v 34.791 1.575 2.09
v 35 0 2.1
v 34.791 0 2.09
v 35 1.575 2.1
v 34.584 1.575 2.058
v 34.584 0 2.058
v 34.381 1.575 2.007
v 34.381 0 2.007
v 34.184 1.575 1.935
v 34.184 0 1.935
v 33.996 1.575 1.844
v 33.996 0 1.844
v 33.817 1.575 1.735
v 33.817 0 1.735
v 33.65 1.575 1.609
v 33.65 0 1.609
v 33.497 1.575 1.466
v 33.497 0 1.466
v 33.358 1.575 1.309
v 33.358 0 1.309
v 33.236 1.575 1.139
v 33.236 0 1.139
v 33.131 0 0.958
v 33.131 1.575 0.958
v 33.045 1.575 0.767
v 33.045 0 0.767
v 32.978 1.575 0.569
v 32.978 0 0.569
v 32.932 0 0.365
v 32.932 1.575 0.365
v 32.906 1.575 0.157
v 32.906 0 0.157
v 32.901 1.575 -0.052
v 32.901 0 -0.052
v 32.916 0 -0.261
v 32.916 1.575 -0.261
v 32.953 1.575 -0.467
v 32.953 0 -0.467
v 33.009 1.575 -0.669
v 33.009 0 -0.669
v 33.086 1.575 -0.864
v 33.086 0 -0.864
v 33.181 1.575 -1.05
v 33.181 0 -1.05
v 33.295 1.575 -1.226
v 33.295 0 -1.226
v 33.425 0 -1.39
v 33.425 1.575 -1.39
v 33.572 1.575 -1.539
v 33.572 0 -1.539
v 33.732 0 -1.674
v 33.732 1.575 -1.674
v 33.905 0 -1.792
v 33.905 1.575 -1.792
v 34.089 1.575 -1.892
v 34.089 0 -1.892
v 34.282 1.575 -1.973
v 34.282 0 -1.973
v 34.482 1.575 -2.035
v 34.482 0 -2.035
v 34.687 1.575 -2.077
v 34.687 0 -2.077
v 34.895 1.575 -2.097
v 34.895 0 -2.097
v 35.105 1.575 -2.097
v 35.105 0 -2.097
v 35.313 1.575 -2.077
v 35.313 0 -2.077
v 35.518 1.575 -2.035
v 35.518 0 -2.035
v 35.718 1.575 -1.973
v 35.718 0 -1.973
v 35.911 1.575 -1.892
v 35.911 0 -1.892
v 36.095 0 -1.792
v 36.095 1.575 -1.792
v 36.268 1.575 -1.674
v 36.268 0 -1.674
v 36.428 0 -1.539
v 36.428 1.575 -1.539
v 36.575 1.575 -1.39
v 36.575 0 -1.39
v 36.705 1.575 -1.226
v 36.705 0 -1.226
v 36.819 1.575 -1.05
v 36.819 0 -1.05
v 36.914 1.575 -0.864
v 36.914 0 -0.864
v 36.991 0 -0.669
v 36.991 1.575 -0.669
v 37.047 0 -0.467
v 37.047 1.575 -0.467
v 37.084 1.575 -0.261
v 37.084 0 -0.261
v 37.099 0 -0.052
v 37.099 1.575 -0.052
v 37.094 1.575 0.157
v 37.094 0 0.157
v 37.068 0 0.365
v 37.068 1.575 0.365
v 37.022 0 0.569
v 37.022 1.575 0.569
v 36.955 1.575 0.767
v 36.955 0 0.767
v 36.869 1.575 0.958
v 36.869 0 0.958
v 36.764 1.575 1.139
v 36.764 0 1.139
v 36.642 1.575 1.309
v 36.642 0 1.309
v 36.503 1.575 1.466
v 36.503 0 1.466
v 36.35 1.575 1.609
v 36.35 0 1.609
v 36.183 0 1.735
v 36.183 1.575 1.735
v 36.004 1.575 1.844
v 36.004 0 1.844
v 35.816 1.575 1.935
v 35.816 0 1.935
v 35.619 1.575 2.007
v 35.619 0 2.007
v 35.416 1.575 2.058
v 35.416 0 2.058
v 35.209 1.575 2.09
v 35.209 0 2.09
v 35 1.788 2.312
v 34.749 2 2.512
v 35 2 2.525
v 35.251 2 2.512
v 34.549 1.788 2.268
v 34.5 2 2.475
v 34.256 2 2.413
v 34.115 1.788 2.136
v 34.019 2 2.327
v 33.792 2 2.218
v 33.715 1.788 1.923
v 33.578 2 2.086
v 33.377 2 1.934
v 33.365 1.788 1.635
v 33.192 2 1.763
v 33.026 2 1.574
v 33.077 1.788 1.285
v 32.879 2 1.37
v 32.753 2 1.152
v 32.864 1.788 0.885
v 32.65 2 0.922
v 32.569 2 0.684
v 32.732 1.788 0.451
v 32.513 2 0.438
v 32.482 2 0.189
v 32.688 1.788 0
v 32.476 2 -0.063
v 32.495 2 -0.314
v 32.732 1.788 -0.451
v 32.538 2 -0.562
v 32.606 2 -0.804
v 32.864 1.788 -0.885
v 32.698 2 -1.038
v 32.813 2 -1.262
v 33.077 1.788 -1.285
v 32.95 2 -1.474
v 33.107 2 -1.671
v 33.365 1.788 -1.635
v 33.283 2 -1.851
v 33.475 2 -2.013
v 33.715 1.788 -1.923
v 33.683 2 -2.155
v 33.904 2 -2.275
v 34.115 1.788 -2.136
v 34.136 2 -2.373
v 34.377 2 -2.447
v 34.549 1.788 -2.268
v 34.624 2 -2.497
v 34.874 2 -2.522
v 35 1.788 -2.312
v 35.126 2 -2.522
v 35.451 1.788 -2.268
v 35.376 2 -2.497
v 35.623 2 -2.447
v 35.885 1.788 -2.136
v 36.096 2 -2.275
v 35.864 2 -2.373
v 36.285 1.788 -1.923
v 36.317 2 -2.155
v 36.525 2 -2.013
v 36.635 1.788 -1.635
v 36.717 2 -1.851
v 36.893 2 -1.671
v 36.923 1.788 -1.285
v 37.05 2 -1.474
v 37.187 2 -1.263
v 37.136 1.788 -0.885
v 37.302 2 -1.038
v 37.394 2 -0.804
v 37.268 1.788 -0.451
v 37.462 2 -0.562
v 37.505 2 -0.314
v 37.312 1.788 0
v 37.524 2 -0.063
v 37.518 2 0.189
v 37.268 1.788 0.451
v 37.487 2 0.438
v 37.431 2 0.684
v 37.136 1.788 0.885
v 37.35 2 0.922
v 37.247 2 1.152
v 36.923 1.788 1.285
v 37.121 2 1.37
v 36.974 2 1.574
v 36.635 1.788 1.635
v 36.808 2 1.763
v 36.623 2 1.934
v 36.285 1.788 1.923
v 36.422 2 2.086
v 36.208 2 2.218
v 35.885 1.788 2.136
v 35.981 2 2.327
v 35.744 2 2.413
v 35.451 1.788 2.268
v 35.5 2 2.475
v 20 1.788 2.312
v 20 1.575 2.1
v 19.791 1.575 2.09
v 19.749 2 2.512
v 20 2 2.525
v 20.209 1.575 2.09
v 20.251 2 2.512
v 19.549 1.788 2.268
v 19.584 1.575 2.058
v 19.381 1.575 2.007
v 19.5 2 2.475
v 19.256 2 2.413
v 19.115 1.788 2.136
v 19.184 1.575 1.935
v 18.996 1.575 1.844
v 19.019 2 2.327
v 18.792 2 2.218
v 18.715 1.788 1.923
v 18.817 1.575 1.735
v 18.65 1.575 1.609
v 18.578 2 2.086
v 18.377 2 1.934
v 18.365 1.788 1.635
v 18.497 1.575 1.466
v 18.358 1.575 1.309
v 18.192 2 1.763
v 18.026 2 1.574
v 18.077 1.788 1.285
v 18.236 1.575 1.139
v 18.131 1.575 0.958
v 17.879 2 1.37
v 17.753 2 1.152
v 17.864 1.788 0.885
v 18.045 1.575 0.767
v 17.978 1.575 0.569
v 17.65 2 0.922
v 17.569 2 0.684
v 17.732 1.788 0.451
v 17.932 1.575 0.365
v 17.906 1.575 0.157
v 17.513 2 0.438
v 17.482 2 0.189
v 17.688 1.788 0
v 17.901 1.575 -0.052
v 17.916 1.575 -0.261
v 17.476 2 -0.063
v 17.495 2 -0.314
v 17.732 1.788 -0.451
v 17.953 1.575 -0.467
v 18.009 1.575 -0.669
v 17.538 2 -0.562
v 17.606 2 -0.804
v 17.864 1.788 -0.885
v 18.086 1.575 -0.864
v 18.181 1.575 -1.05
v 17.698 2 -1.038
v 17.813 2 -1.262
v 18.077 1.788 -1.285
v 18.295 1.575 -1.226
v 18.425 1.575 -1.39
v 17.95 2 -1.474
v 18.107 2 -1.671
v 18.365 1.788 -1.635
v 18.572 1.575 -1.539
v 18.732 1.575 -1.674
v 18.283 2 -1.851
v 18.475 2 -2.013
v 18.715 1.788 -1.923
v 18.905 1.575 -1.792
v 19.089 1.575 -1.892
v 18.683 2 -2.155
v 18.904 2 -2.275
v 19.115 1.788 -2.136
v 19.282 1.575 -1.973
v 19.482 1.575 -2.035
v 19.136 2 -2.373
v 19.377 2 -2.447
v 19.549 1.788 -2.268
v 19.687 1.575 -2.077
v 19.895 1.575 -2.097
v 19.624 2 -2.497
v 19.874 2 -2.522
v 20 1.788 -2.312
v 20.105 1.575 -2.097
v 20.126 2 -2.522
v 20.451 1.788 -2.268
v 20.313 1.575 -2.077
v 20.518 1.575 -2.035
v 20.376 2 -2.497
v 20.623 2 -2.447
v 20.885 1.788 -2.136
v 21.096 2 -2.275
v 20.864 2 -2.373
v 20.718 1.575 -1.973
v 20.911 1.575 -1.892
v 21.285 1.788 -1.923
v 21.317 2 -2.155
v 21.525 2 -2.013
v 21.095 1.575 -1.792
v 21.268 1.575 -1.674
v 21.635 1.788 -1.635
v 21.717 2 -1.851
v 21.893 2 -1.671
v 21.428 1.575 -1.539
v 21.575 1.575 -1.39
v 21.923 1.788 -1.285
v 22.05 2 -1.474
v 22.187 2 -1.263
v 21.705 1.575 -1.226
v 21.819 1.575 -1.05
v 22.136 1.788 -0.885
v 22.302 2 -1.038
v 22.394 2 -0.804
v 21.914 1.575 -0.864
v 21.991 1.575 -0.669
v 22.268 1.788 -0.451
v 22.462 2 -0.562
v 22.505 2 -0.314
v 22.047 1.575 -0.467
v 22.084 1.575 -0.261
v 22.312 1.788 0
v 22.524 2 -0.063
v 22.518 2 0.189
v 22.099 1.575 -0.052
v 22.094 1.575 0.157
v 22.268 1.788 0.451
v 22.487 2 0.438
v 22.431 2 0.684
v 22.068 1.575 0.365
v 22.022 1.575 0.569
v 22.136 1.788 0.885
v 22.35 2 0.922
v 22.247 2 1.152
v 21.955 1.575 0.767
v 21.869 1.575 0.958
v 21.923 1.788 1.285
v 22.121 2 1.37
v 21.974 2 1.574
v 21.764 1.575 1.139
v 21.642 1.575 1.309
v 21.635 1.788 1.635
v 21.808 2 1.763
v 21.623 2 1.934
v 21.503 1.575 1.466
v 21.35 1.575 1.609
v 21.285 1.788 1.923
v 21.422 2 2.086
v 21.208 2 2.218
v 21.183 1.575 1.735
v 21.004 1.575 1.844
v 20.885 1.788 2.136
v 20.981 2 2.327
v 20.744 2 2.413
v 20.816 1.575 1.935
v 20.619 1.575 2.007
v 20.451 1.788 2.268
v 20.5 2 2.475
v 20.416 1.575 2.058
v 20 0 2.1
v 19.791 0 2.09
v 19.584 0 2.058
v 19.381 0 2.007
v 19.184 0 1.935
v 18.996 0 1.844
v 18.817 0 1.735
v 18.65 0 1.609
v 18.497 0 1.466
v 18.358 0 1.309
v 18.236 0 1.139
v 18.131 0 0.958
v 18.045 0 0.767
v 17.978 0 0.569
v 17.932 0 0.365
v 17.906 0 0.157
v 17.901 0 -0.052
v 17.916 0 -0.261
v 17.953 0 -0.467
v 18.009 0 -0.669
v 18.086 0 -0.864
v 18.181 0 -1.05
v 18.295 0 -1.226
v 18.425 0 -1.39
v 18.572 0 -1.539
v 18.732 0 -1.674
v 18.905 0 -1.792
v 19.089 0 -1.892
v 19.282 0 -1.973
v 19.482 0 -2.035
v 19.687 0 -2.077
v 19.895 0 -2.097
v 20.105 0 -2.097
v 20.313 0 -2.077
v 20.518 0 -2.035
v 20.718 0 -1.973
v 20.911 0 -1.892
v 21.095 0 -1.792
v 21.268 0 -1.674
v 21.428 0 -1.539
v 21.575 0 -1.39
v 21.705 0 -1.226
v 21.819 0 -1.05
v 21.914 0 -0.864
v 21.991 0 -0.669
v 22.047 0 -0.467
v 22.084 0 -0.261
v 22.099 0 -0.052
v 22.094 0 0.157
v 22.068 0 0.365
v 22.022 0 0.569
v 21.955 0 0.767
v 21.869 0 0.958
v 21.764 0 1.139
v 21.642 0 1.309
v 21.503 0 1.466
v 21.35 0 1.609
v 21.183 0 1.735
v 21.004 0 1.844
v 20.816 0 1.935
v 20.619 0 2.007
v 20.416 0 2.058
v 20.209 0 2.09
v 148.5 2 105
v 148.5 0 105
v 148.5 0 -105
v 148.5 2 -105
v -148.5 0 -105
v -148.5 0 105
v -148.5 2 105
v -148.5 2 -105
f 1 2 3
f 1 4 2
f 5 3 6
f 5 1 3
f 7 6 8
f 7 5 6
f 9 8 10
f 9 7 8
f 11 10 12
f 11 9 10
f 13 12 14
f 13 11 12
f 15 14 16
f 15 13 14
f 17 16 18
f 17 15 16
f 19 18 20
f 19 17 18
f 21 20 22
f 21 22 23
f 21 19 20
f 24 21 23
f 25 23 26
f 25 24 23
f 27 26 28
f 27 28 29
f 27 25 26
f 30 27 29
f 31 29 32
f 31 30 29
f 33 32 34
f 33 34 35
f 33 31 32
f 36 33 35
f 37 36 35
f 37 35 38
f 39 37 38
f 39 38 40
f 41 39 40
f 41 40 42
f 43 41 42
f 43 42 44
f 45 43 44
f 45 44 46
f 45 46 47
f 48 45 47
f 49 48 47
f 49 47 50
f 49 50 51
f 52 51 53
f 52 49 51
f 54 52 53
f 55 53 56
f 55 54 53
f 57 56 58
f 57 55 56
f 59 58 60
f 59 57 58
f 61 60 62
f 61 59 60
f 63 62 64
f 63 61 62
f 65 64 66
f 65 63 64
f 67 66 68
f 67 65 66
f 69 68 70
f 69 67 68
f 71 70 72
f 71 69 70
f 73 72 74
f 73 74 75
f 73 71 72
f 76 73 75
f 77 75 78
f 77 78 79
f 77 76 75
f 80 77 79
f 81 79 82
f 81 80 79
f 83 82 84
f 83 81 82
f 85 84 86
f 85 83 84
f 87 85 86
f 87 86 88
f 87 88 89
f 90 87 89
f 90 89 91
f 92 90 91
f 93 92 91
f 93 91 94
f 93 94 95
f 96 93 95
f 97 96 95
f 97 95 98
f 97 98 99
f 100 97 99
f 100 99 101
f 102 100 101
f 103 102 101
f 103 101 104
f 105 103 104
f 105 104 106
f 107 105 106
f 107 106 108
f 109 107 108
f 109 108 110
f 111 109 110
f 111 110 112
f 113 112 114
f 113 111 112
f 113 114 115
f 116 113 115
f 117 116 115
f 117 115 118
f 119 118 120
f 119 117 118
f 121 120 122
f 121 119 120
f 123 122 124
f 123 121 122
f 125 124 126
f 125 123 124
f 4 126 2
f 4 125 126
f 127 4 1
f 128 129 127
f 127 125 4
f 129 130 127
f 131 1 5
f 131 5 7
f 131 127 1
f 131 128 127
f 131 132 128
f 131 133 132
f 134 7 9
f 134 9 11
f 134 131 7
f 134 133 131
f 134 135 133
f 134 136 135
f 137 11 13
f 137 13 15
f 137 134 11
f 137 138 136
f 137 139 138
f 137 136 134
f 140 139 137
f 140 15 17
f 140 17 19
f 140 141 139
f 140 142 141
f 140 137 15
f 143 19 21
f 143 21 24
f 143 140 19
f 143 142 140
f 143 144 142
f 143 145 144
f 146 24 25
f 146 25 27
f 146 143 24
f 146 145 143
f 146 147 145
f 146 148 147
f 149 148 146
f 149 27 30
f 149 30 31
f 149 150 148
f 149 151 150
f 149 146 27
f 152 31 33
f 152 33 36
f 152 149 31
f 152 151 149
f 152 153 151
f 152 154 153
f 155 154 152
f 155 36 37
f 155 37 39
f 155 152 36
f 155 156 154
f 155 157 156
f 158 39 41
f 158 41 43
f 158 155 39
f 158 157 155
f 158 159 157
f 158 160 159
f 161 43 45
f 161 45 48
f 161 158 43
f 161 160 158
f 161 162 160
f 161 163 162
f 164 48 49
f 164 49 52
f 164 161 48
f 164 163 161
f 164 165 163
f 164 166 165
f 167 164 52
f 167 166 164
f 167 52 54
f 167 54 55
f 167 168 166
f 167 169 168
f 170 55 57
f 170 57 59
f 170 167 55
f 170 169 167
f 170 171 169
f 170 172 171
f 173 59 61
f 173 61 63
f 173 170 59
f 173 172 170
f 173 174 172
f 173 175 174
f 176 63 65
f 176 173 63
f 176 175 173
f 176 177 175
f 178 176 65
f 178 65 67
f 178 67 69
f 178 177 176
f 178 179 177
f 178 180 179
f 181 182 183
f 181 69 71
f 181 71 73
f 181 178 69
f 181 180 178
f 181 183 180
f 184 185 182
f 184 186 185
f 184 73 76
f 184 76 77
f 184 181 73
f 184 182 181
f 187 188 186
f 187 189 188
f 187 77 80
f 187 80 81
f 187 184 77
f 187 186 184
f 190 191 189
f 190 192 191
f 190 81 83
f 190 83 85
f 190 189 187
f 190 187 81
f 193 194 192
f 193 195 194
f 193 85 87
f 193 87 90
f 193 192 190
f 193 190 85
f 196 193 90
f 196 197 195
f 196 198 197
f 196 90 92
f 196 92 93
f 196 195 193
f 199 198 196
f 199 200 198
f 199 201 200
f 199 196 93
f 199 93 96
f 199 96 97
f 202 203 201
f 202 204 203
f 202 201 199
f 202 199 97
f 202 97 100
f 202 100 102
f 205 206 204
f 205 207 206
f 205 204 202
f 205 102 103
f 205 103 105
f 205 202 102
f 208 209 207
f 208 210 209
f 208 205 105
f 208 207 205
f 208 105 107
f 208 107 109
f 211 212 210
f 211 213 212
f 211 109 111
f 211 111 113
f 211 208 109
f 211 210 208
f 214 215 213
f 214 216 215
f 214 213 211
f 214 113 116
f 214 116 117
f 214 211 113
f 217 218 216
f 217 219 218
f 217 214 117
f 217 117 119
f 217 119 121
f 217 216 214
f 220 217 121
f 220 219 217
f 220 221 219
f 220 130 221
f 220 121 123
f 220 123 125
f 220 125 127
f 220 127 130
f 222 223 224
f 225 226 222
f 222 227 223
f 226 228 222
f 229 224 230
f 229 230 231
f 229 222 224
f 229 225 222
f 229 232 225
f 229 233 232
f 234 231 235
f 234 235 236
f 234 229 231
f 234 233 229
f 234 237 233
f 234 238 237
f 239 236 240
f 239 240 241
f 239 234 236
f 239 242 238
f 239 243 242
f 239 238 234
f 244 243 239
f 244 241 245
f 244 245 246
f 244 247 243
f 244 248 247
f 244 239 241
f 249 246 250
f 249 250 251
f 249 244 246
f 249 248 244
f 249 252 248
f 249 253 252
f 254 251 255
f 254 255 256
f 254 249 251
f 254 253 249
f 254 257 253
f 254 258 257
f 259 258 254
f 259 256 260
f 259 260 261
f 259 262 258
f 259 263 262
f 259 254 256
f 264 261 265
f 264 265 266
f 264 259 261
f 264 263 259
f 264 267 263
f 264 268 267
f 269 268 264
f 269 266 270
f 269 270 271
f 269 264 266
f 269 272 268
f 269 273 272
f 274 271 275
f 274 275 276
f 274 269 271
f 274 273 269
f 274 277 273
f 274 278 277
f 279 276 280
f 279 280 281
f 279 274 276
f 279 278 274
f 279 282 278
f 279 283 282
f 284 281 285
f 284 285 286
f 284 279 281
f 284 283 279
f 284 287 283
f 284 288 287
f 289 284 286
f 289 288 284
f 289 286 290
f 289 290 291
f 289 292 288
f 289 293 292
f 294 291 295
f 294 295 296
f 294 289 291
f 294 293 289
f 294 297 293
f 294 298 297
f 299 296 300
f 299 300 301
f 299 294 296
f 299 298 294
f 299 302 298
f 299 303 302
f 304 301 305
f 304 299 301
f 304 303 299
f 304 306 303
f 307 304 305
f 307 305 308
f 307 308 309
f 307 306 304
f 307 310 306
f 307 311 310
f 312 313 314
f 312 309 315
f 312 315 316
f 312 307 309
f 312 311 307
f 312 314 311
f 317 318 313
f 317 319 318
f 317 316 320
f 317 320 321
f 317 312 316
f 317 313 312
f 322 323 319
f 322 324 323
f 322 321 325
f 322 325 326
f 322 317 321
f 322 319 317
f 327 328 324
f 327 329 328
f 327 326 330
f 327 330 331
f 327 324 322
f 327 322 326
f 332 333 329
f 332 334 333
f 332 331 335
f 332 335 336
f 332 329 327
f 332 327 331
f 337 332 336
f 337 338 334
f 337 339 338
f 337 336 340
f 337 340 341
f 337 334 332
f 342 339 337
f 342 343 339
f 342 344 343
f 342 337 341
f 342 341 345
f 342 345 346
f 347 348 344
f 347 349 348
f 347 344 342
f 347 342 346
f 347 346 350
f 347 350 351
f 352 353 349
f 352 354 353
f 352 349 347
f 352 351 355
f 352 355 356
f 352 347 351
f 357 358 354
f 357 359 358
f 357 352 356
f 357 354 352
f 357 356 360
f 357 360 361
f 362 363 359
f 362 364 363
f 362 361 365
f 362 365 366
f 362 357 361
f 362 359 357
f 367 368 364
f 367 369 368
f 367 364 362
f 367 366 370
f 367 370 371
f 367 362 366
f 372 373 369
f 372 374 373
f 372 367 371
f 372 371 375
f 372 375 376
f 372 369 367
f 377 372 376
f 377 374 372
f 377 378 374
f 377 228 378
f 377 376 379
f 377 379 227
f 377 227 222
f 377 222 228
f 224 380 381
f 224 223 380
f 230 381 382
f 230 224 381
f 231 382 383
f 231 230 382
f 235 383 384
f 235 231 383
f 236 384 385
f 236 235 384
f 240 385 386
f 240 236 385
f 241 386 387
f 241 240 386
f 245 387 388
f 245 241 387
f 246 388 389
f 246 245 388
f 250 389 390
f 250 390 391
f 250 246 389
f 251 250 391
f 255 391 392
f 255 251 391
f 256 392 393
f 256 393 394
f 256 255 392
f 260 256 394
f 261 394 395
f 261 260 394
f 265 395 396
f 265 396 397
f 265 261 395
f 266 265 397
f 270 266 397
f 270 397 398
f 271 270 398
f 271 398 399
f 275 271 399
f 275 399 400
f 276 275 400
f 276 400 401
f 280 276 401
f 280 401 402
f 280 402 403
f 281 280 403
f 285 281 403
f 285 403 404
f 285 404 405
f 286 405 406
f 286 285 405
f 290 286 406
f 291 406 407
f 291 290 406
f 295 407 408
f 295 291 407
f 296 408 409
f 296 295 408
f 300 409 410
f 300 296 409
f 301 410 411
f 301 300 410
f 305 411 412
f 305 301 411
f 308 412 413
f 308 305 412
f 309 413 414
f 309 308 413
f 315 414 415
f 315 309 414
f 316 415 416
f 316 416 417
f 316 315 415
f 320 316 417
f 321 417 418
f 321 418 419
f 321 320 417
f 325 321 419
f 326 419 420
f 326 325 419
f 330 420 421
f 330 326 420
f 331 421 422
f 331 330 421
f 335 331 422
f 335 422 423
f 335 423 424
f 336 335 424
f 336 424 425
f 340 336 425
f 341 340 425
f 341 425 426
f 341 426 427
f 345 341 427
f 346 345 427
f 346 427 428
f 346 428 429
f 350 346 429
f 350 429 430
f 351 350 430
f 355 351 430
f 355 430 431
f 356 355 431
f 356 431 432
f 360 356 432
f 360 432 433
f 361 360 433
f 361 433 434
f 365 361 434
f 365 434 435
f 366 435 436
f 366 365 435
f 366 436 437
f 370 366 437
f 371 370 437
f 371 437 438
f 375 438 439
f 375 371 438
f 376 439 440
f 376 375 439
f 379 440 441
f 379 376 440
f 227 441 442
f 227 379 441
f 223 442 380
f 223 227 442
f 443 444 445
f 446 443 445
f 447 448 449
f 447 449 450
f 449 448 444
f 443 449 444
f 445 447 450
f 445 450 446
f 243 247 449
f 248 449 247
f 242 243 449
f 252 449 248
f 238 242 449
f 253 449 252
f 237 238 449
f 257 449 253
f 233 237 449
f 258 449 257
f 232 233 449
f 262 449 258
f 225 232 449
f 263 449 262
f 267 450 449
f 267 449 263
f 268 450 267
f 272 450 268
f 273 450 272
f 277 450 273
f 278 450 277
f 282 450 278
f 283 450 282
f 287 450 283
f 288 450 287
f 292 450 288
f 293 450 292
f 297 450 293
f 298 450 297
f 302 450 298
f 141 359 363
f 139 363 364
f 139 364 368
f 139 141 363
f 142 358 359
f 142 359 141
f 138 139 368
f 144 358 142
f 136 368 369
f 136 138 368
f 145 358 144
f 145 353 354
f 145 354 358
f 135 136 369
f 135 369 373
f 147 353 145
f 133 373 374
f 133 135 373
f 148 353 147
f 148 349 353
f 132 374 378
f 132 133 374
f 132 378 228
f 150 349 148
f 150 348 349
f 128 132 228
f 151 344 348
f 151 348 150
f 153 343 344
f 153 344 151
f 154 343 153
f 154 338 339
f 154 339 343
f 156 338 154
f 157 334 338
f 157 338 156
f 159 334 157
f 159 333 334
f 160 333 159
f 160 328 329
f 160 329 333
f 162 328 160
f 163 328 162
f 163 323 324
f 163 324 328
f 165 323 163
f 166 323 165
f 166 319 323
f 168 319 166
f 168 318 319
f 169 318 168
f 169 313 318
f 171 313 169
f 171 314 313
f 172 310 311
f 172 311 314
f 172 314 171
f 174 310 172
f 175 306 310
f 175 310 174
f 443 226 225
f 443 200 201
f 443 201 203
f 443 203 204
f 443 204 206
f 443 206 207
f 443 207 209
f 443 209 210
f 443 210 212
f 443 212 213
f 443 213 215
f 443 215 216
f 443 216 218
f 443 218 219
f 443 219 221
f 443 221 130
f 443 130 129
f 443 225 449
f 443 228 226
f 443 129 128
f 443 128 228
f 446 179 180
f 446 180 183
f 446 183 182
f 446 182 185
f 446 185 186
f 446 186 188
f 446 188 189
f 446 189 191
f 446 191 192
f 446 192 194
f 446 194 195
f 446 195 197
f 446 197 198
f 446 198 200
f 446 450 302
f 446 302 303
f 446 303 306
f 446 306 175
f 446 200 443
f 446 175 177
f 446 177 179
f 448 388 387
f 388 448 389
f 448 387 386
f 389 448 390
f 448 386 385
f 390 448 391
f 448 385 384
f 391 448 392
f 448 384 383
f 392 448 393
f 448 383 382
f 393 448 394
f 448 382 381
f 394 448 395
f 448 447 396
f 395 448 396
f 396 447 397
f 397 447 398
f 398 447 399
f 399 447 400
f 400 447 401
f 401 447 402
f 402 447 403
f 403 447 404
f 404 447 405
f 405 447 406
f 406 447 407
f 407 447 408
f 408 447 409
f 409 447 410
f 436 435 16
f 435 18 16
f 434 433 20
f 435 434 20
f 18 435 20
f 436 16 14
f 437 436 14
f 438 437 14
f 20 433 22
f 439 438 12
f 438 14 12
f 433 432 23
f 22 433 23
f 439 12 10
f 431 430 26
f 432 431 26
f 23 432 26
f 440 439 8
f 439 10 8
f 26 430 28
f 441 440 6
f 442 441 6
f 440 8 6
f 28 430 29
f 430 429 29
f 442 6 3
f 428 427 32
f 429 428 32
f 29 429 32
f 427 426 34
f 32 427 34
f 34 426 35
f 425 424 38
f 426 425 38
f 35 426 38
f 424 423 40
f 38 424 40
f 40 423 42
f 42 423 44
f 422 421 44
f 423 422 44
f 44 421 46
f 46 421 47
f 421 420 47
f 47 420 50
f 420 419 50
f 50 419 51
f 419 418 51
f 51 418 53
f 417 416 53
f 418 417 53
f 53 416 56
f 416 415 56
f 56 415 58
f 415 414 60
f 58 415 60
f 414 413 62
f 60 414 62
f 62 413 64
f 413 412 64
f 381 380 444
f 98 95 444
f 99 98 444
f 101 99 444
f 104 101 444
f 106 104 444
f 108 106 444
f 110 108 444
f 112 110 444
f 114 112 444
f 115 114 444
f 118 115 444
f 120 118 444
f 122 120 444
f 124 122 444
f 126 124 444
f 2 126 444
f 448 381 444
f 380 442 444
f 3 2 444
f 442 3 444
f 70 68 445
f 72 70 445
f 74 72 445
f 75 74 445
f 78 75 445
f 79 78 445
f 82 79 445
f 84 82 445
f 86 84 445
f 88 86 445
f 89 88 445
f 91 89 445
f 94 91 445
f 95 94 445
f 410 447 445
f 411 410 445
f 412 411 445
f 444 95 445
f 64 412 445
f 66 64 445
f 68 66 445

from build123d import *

# Parameters (mm, degrees)
SKETCH1_W                  = 297
SKETCH1_H                  = 210
BOSS_EXTRUDE1_DEPTH        = 2
M5_TAPPED_HOLE1_AT_2_COUNT = 2
M5_TAPPED_HOLE1_AT_2_PITCH = 15


with BuildPart() as part:
    # Sketch1 → Boss-Extrude1 (new body)
    with BuildSketch(Plane(origin=(0, 0, 0), x_dir=(1, 0, 0), z_dir=(0, 1, 0))):
        Rectangle(SKETCH1_W, SKETCH1_H)
    extrude(amount=BOSS_EXTRUDE1_DEPTH)

    # Sketch3 → M5 Tapped Hole1 (revolve, cut)
    with BuildSketch(Plane(origin=(20, 2, 0), x_dir=(0, 0, 1), z_dir=(1, 0, 0))):
        Polygon((0, 0), (0, 2), (2.1, 2), (2.1, 0.425), (2.525, 0), align=None)
    m5_tapped_hole1 = revolve(axis=Axis((20, 8.35, 0), (0, -1, 0)), mode=Mode.SUBTRACT)

    # M5 Tapped Hole1 at 2: M5 Tapped Hole1 ×2
    with Locations(*[(i * M5_TAPPED_HOLE1_AT_2_PITCH, 0, 0) for i in range(1, M5_TAPPED_HOLE1_AT_2_COUNT)]):
        add(m5_tapped_hole1, mode=Mode.SUBTRACT)


solid = part.part
